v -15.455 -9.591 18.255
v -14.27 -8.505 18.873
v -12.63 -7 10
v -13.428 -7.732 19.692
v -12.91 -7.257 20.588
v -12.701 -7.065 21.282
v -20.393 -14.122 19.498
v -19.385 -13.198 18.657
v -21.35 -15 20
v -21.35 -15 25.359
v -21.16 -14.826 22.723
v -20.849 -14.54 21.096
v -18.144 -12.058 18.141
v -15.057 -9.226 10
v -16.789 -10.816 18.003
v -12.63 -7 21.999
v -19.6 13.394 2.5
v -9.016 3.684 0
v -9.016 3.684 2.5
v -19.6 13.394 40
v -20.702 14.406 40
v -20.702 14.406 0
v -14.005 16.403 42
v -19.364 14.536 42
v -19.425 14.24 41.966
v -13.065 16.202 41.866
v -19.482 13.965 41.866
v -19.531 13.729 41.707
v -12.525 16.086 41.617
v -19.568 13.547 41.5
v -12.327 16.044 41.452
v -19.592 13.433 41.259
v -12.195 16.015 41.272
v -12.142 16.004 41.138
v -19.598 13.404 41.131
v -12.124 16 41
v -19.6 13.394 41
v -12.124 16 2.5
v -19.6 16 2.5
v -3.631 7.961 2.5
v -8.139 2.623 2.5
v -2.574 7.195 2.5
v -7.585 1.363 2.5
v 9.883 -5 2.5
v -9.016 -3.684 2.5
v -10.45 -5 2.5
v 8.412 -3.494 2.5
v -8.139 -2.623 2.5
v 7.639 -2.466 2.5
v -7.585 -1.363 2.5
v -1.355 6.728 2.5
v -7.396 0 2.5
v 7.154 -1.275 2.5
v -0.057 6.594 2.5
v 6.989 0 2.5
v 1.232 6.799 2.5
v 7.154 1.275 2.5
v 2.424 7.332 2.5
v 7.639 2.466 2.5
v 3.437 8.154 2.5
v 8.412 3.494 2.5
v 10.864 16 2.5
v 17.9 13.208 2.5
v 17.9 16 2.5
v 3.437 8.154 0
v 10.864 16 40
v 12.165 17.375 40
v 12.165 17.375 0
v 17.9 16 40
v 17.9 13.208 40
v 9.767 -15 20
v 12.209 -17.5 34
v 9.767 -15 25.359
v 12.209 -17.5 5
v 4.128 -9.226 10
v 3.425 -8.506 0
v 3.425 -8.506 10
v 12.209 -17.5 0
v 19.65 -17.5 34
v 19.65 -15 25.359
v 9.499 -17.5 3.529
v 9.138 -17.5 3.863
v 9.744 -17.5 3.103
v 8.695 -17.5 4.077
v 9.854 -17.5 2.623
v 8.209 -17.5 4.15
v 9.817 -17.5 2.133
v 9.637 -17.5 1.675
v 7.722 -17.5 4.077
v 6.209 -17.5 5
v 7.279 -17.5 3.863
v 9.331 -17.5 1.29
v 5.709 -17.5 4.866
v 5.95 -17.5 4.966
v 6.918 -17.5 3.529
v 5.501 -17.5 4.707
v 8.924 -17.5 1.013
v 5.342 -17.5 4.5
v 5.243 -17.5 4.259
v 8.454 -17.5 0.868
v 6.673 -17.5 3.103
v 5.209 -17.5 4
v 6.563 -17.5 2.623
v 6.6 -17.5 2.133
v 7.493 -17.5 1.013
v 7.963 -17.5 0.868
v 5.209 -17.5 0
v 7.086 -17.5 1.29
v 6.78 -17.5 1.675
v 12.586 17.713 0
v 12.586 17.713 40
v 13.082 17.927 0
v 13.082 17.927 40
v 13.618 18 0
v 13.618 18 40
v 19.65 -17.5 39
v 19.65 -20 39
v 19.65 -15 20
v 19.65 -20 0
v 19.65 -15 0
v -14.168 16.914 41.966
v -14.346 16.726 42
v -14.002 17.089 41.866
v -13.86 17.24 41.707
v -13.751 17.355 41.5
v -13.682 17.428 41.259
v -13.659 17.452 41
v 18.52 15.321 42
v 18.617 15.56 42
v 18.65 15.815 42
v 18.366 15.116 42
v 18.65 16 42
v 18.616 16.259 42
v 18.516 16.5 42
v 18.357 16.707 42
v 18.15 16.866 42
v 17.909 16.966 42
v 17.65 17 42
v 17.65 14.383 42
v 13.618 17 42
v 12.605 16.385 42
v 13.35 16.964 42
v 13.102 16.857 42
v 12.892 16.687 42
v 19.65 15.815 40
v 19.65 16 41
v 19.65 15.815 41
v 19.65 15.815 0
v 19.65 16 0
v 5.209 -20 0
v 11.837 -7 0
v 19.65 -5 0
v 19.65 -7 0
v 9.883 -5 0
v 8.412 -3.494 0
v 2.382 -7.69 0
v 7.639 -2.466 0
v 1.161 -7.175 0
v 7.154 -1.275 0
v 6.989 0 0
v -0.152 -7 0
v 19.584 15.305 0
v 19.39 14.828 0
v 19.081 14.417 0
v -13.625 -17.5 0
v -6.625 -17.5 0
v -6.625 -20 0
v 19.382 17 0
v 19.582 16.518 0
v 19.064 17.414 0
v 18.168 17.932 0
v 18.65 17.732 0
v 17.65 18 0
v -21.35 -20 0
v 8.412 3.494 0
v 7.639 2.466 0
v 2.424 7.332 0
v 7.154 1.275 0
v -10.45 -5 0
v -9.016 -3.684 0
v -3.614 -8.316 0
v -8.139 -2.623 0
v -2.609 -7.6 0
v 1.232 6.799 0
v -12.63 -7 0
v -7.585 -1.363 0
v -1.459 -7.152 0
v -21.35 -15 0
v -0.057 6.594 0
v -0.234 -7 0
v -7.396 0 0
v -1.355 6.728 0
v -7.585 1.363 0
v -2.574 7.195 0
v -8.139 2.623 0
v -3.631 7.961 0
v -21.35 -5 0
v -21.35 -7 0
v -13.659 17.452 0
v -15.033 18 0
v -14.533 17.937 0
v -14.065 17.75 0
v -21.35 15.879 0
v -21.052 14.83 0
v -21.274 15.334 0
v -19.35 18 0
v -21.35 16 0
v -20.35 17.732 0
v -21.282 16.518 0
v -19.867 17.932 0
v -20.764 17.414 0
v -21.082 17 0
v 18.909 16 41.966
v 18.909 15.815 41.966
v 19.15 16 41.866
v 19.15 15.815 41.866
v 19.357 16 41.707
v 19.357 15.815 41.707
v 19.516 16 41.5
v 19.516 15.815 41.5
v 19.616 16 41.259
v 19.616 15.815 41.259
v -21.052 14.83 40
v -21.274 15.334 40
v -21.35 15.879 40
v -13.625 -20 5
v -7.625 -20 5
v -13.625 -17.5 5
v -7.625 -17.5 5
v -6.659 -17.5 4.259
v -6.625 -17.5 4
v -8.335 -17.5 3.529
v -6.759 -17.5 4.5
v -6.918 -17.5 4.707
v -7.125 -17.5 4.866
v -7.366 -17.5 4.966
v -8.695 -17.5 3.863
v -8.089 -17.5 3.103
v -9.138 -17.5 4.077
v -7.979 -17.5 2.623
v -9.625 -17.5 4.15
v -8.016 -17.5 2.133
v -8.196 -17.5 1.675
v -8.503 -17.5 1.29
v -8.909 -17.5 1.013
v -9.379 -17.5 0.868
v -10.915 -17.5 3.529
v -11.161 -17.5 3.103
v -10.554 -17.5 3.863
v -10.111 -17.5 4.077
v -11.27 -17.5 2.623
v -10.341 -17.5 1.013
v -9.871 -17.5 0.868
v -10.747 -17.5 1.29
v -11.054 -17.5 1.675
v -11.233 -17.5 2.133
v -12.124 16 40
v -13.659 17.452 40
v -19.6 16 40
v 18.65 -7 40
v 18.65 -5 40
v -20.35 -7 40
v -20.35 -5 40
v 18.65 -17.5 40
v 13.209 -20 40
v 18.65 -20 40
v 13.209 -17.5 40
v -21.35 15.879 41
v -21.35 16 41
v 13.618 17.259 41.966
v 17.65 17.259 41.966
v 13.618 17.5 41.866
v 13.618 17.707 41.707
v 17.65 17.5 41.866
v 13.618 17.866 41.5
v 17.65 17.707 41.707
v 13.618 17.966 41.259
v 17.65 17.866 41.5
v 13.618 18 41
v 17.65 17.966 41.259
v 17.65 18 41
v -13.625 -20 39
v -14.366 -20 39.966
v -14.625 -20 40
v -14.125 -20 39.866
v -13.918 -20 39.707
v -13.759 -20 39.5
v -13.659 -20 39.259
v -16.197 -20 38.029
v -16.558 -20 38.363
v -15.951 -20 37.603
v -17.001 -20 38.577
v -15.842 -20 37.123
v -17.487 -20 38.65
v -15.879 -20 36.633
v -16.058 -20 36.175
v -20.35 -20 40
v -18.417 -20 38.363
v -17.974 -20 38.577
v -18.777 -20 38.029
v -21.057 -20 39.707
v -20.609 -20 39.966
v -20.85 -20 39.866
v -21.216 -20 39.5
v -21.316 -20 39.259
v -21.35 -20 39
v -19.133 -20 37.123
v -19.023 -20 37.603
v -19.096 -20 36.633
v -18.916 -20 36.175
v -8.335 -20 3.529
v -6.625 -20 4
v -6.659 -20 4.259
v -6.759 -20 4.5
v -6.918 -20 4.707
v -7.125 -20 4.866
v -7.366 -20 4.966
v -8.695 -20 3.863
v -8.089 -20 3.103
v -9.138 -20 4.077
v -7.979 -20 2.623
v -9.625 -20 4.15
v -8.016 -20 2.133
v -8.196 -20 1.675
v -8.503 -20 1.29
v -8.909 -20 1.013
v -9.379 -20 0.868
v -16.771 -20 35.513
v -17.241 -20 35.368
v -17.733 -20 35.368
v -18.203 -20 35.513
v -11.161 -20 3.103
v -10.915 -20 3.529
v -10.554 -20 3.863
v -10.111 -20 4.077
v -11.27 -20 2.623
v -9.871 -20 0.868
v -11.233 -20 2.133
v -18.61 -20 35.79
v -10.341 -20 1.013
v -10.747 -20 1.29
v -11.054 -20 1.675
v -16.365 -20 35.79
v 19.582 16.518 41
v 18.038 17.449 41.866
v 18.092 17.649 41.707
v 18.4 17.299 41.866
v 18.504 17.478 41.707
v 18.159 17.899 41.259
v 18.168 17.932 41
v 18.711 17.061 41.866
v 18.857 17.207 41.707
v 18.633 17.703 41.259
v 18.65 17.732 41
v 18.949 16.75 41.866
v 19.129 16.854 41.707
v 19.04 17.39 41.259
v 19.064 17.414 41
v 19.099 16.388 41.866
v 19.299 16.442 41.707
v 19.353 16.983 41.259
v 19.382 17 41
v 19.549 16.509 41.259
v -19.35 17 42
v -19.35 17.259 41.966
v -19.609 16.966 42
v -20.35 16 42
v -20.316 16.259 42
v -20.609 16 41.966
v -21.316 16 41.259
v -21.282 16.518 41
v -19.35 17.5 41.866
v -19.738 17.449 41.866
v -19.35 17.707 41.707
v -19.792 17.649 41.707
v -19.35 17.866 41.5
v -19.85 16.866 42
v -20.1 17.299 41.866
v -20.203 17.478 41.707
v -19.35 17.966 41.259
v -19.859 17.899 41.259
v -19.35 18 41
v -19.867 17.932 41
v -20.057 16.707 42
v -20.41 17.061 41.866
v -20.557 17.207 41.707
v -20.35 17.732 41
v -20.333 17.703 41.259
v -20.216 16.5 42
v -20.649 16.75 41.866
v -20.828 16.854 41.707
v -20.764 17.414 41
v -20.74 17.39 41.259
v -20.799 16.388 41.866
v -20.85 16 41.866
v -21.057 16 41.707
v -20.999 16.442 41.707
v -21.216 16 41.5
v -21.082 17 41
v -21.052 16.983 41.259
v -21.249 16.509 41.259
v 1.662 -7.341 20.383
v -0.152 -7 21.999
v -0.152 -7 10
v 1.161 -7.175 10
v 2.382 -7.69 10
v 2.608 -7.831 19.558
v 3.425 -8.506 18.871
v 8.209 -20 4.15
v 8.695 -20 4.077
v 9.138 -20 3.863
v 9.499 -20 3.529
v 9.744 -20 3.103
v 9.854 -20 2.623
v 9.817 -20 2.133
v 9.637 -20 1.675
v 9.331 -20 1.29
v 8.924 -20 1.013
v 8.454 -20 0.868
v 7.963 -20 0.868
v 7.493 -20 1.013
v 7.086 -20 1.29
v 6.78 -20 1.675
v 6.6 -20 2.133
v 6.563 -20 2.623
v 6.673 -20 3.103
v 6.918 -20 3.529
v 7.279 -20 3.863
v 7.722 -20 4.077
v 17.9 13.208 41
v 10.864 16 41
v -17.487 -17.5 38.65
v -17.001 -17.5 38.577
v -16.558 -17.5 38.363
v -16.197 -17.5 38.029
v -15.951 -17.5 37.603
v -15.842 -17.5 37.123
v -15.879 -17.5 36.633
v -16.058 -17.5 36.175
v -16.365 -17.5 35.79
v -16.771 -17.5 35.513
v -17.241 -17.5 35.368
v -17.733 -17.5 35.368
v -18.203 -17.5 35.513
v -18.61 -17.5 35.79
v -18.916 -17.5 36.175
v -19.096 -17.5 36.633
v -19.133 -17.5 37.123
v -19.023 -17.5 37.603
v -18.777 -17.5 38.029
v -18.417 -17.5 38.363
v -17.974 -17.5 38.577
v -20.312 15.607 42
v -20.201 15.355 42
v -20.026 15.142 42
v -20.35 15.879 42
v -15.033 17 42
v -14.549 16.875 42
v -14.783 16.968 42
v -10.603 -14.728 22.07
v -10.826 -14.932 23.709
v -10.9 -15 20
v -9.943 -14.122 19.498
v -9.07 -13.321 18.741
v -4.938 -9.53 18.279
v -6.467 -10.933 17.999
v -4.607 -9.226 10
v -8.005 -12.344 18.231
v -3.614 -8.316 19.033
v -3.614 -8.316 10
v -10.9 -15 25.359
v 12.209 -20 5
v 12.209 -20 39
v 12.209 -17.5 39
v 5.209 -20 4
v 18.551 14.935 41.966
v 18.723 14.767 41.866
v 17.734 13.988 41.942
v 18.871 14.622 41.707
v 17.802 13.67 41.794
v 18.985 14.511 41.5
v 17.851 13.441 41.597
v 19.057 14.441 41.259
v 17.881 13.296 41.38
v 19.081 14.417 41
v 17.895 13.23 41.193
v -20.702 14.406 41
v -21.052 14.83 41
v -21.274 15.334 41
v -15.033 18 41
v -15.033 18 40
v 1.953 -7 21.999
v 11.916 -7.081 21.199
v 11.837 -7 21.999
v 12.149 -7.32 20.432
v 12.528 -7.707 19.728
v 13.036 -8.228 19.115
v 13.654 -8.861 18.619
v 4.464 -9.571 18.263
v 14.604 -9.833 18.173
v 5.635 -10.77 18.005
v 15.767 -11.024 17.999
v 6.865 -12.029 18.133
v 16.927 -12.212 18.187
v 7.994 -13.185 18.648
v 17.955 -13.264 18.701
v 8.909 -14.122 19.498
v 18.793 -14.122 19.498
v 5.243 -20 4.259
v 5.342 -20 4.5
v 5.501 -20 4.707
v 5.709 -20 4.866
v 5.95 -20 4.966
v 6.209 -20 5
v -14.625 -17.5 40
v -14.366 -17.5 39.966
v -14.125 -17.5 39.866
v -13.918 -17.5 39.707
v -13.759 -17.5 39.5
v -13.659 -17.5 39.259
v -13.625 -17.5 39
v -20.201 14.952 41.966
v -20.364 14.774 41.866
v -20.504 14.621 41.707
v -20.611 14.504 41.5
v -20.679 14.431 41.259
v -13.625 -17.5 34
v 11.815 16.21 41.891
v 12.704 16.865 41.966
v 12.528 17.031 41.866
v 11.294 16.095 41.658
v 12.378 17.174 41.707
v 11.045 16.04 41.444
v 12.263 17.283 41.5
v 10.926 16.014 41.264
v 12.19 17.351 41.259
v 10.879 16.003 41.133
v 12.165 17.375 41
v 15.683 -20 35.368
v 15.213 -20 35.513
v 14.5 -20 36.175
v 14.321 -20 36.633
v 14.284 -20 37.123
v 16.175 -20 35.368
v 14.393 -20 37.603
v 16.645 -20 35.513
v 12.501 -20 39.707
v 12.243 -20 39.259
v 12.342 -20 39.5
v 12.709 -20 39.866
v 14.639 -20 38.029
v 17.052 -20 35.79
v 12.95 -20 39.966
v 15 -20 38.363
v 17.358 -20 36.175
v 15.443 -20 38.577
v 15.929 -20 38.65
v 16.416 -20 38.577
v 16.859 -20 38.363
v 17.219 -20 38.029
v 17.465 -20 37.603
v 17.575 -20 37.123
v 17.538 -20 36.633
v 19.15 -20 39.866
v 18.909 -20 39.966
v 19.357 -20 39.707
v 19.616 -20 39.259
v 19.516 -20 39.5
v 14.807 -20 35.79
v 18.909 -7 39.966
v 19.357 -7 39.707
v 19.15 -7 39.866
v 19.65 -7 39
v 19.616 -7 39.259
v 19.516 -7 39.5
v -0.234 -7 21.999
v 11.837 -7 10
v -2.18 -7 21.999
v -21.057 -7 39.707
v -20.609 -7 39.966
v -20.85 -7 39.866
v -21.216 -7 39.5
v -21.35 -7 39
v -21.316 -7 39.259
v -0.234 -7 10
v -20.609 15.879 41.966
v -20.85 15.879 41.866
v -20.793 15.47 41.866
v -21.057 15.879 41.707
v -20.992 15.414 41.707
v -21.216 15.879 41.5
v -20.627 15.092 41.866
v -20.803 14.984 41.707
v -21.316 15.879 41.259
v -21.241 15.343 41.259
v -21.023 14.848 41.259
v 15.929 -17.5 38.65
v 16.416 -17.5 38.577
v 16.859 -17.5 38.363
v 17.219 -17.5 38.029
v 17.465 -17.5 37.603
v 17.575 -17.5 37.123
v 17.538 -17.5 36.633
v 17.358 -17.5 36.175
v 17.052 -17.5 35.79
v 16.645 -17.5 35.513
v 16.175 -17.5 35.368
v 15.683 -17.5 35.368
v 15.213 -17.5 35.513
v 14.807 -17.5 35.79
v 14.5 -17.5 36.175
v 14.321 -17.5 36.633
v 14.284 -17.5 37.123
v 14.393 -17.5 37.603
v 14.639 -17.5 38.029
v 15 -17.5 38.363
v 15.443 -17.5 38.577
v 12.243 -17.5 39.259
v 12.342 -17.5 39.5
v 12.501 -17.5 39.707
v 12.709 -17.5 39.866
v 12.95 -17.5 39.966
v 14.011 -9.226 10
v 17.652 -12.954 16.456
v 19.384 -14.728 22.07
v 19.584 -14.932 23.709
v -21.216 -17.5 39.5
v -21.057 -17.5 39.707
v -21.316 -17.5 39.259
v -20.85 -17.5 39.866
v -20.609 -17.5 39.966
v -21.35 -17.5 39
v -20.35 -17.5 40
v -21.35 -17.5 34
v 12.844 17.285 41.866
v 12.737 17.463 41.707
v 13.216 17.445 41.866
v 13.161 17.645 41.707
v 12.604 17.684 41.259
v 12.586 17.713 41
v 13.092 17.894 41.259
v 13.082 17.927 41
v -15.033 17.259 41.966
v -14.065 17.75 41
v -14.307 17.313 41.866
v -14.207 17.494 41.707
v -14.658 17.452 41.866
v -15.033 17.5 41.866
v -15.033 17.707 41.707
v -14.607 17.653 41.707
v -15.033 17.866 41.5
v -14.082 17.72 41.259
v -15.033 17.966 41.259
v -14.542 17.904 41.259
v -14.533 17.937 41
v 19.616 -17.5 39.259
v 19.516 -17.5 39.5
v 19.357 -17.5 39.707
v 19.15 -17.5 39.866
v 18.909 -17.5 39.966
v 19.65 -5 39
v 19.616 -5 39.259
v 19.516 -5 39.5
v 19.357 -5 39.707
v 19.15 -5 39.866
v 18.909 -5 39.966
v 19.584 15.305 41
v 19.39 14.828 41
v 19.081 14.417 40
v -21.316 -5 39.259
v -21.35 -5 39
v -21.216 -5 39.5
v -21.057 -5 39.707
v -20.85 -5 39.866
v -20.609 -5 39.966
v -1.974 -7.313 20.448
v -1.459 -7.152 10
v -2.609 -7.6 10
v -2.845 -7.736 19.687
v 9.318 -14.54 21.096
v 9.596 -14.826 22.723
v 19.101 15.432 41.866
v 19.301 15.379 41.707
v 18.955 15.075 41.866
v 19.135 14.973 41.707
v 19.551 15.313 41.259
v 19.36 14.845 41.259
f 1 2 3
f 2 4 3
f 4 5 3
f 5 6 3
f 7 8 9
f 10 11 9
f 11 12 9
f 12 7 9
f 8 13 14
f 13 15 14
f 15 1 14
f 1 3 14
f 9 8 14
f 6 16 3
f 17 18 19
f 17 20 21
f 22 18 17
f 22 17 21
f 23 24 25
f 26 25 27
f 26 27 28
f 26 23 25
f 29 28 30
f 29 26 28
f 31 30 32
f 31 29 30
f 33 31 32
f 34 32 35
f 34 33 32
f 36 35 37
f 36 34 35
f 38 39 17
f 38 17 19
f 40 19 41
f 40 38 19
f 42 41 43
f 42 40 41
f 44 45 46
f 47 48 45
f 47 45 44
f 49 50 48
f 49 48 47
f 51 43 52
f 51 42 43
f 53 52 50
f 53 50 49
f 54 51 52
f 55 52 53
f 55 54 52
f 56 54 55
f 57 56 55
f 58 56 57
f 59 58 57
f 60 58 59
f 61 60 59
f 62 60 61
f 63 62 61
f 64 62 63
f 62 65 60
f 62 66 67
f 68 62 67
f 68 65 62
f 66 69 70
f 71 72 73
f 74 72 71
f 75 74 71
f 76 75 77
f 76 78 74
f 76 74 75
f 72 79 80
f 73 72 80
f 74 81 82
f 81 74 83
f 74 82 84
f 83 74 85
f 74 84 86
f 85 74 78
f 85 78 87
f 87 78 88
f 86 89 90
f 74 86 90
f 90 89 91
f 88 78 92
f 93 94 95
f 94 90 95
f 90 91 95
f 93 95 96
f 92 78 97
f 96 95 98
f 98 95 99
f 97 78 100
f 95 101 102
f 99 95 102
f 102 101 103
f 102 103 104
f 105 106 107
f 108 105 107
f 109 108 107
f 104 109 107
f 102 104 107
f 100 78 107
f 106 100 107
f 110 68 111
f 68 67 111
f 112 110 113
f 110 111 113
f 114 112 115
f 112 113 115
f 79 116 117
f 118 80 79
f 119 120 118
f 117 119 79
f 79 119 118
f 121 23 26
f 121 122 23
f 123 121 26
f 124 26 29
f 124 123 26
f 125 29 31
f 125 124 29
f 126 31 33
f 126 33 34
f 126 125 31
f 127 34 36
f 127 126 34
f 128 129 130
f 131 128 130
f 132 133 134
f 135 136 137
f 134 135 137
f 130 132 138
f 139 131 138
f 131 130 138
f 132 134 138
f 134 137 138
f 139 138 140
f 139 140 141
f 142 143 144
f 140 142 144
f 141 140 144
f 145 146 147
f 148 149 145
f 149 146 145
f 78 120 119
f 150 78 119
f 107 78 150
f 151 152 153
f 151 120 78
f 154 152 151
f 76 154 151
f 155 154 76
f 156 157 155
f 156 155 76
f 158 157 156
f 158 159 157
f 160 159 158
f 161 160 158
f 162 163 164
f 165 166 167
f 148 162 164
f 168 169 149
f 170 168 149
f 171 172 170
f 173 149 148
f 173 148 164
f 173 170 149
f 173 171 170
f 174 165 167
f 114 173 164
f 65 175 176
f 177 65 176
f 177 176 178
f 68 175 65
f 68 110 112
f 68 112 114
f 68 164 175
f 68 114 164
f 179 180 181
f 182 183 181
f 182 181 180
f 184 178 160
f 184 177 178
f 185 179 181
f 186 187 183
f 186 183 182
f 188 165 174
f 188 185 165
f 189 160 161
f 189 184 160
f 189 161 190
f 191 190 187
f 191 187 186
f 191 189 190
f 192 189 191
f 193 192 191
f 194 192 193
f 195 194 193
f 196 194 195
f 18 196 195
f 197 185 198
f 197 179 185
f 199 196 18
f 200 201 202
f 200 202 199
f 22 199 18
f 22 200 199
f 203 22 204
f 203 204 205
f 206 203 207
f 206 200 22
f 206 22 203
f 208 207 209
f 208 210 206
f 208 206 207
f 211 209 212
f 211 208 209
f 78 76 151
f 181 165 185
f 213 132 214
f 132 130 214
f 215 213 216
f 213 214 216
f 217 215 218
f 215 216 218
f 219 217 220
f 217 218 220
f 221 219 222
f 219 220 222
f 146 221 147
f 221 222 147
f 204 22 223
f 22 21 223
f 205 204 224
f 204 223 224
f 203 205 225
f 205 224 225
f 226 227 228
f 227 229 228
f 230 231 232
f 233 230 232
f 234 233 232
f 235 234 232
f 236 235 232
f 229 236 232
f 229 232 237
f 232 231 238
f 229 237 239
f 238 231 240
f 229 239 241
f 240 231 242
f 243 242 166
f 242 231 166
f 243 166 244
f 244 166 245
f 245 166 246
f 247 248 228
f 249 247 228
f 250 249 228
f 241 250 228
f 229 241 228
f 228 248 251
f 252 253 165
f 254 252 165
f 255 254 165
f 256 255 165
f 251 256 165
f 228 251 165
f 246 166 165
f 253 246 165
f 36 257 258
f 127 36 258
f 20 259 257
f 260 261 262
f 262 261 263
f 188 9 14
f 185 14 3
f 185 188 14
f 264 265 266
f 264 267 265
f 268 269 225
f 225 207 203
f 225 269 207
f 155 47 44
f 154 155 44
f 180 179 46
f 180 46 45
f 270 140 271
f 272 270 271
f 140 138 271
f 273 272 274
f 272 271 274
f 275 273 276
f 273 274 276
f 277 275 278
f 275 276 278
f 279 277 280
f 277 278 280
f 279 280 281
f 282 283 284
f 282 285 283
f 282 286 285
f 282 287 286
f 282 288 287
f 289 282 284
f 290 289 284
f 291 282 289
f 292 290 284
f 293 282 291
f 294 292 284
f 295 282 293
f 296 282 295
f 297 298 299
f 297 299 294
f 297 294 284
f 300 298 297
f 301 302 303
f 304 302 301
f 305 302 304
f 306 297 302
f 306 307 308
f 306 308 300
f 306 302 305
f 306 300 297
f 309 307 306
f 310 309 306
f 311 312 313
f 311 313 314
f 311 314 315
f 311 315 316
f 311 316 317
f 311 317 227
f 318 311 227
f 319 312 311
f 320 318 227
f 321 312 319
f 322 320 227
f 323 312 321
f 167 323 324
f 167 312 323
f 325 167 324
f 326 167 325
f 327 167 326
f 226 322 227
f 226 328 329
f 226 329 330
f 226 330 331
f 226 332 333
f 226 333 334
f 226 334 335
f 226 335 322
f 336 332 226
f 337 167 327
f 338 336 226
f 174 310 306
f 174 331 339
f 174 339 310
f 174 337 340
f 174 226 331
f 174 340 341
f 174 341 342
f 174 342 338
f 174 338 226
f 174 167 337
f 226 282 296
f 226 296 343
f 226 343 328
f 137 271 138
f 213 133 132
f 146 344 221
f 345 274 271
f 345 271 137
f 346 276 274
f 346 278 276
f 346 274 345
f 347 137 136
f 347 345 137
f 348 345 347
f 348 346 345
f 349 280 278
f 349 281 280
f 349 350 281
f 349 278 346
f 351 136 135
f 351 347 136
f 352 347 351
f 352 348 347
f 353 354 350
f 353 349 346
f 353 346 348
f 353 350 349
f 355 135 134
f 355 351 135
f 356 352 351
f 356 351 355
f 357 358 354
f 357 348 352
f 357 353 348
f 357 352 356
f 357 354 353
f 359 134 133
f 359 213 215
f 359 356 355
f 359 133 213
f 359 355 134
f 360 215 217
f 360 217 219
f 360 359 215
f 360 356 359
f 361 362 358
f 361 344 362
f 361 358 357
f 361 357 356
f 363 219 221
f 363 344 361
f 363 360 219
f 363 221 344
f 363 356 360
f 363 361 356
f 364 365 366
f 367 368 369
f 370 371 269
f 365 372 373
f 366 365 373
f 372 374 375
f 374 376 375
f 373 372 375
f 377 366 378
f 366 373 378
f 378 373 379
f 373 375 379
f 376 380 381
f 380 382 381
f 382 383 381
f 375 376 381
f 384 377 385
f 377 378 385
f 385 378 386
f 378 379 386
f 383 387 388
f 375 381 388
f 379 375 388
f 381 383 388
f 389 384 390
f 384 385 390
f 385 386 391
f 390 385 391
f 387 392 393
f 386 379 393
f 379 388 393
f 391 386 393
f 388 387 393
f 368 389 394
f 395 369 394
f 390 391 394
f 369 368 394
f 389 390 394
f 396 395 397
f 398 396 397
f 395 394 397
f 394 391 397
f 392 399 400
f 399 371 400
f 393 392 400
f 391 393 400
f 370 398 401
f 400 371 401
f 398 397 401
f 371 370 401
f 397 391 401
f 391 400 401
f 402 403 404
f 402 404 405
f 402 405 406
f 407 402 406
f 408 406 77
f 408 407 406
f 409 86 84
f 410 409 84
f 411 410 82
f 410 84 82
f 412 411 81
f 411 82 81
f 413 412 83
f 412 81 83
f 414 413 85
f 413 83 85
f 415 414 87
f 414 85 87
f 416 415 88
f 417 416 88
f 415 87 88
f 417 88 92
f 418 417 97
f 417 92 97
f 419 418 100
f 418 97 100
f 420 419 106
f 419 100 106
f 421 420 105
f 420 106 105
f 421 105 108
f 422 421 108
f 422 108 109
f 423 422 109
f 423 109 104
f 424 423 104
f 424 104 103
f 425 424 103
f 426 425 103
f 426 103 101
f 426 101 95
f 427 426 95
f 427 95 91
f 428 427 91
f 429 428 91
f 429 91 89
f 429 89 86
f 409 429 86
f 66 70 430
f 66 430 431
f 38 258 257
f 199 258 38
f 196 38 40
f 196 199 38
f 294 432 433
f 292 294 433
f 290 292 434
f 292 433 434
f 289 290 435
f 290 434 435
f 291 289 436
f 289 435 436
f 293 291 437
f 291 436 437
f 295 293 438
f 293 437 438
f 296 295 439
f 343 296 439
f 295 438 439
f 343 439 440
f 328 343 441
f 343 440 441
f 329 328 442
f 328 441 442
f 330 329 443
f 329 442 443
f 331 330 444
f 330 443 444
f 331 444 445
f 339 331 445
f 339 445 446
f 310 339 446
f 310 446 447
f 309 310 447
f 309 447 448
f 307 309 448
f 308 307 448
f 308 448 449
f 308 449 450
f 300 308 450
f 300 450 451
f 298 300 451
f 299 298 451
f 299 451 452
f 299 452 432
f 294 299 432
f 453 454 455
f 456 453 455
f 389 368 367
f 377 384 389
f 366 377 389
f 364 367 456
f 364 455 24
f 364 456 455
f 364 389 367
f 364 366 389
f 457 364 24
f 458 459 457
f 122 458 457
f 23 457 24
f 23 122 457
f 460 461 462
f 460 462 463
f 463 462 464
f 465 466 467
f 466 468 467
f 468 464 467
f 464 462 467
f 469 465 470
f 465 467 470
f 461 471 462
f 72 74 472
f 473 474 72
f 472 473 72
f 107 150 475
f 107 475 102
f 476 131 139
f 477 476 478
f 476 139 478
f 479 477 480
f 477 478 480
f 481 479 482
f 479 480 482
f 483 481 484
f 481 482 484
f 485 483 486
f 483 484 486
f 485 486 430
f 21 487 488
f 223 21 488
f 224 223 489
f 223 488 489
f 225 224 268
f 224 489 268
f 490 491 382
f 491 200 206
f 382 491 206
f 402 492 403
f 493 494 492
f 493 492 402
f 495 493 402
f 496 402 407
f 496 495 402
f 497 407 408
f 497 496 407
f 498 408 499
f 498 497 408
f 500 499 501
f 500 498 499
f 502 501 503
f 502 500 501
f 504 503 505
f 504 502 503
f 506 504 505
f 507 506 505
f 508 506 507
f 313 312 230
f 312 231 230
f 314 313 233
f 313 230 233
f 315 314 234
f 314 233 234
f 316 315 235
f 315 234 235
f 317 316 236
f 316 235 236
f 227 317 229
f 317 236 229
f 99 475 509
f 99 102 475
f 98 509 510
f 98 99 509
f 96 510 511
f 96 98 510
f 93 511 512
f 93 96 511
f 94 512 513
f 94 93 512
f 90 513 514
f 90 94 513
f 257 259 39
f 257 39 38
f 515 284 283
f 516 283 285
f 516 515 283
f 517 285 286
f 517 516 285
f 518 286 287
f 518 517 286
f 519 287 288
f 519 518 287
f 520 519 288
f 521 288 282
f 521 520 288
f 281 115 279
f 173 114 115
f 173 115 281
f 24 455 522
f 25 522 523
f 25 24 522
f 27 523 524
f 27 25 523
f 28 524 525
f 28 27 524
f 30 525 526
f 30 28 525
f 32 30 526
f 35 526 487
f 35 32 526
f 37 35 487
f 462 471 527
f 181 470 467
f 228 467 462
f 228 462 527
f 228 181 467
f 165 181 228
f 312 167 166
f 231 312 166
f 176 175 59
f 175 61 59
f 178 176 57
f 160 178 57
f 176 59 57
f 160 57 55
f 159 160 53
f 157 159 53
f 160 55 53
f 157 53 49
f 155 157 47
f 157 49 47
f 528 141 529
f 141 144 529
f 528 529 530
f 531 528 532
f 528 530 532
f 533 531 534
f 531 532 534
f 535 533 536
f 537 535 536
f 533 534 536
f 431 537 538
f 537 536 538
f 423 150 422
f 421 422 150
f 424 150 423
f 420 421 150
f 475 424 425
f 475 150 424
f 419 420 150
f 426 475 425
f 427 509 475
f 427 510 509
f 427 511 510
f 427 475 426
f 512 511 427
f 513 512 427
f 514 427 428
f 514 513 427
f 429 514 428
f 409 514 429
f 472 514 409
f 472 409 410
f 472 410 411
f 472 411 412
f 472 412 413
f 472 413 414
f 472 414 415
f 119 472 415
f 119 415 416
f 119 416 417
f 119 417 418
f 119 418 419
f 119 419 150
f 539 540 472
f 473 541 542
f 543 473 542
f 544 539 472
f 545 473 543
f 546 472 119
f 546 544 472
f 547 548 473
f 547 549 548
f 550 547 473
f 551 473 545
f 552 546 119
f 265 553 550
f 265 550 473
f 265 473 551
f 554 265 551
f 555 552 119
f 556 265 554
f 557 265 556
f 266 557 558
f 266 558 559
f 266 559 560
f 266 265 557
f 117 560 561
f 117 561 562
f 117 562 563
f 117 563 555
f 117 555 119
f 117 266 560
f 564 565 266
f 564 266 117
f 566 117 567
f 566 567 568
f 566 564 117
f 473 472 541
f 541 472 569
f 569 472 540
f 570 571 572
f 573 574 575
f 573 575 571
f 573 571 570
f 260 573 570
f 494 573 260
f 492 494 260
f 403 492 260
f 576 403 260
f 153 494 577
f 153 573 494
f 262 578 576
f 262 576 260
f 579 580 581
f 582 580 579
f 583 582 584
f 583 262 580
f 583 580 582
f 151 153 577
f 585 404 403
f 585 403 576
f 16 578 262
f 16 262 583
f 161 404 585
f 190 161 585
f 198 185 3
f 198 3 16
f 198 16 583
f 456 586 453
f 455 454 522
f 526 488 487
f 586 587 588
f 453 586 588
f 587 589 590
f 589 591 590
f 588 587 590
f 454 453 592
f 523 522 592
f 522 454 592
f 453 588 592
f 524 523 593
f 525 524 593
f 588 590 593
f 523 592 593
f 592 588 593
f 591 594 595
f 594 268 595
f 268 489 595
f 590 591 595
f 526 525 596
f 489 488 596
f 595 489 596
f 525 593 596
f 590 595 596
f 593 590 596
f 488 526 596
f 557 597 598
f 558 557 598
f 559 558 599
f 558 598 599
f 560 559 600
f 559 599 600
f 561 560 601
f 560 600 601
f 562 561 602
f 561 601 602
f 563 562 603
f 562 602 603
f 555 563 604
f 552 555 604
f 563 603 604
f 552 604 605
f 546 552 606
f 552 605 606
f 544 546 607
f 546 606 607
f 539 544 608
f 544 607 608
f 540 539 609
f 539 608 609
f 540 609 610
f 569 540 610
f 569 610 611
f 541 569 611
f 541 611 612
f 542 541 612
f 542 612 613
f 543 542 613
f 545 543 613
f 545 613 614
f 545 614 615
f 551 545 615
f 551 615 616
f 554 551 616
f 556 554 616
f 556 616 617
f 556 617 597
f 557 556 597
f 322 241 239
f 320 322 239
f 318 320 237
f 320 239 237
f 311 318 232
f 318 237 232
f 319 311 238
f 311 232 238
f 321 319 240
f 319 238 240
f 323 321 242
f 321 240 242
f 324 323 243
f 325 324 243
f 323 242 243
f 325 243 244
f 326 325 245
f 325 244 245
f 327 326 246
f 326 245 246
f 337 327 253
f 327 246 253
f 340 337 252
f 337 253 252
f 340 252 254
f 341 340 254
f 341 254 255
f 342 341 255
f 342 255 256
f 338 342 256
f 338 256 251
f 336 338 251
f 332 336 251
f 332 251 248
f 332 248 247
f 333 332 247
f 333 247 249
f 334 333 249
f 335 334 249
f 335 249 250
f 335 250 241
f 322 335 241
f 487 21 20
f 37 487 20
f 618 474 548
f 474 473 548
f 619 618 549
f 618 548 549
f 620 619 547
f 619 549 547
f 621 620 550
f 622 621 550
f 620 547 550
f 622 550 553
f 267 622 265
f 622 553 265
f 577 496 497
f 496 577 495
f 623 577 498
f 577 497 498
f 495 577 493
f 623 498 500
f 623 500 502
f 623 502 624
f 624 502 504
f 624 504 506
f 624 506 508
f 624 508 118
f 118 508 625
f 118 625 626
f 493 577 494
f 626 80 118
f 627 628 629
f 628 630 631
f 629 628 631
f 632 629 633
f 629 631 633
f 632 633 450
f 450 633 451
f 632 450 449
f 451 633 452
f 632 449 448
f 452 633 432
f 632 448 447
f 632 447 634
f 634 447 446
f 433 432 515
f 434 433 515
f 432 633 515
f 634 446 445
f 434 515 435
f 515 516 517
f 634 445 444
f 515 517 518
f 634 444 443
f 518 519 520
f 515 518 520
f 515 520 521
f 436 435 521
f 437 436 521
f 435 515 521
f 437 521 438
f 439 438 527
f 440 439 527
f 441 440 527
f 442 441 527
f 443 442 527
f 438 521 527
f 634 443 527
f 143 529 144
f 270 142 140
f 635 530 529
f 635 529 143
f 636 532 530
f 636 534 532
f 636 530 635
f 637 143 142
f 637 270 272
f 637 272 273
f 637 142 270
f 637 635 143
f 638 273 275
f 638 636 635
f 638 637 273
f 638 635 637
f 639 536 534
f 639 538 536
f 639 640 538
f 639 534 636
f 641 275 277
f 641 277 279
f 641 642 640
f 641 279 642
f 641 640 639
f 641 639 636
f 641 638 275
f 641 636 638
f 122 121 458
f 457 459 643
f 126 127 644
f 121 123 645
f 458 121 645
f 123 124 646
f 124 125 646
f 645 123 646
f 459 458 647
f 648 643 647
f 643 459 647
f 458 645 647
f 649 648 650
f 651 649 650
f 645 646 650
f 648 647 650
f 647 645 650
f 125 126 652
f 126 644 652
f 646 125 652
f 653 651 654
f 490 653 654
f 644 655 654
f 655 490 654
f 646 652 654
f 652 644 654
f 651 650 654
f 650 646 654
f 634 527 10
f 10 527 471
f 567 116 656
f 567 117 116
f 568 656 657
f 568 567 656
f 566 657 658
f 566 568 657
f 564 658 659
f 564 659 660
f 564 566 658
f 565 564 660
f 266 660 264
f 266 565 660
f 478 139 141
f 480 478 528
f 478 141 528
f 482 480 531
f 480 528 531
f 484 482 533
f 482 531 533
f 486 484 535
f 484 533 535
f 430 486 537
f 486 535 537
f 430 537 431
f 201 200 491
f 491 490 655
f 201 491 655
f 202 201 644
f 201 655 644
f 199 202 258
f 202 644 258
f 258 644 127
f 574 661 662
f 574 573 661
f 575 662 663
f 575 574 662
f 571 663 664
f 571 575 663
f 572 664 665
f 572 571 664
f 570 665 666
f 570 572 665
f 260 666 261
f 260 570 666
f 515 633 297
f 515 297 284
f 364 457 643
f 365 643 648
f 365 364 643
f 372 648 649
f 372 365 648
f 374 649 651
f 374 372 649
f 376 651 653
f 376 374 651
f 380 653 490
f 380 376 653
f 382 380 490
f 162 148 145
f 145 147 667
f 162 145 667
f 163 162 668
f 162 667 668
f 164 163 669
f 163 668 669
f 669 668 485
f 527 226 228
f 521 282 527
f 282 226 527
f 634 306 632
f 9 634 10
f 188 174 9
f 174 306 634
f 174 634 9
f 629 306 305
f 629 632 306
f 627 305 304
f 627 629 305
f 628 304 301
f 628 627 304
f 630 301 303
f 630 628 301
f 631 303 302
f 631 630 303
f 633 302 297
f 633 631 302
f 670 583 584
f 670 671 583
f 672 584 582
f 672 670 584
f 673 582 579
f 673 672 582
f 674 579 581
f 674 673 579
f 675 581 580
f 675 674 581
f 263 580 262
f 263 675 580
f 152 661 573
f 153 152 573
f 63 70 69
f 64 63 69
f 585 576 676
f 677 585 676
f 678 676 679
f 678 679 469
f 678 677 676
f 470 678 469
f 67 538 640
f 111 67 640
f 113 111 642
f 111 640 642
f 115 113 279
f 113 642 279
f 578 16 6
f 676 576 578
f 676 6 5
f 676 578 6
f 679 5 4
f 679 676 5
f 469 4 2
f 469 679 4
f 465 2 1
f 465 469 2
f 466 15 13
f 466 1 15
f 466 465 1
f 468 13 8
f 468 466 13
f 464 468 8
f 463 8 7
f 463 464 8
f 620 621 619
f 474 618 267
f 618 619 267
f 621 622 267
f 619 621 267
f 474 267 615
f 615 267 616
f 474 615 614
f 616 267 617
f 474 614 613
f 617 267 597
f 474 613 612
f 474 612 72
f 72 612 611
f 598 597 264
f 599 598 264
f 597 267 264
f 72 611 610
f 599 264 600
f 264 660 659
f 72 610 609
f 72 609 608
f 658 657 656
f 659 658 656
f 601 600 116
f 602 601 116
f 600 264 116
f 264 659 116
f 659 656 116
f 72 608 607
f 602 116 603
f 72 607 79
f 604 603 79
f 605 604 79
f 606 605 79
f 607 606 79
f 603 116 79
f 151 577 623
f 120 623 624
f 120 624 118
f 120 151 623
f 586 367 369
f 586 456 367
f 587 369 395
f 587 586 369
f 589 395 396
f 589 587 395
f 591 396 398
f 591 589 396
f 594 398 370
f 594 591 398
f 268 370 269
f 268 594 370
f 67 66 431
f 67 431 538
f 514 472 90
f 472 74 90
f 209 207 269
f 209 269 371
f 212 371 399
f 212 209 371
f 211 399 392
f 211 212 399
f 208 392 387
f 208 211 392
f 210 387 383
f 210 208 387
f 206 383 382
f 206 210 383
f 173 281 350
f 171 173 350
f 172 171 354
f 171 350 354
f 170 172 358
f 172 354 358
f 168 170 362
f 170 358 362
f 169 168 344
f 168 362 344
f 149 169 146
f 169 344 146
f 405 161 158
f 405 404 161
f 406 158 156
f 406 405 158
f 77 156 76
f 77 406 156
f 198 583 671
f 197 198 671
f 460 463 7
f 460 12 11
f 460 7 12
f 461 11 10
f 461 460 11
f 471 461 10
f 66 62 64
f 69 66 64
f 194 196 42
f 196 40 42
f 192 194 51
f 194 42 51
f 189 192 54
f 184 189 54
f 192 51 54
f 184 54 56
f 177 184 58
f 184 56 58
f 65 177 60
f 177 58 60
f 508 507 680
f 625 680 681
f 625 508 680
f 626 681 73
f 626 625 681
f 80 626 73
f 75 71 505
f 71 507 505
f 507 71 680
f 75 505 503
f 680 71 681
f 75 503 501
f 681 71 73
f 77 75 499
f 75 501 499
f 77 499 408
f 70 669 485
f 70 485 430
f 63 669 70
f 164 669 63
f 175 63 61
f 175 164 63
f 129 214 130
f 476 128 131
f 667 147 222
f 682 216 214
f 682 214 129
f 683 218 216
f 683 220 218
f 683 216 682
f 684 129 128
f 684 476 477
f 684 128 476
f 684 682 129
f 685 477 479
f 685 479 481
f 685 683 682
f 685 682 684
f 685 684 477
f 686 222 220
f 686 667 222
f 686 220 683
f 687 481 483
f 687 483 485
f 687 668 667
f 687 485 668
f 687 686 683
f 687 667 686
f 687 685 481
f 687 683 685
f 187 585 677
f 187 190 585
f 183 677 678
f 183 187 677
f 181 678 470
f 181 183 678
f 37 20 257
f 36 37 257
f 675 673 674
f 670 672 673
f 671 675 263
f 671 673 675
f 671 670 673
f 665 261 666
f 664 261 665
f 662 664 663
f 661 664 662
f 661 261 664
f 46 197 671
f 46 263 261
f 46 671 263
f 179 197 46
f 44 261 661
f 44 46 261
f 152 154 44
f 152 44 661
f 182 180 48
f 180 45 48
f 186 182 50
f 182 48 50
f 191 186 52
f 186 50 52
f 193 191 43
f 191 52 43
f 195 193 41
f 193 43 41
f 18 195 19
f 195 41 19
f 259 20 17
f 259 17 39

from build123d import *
from OCP.BRepFilletAPI import BRepFilletAPI_MakeChamfer

# Parameters (mm, degrees)
BOSS_EXTRUDE1_DEPTH = 40
SKETCH3_W           = 37.5
SKETCH3_H           = 21
SKETCH3_W_2         = 41
SKETCH3_H_2         = 2
CUT_EXTRUDE1_DEPTH  = 37.5
SKETCH4_W           = 50.283363854
SKETCH4_H           = 54.333359839
CUT_EXTRUDE2_DEPTH  = 37.5
BOSS_EXTRUDE2_DEPTH = 2
SKETCH6_W           = 30
SKETCH6_H           = 8
CUT_EXTRUDE3_DEPTH  = 100
CHAMFER1_SIZE       = 10
CHAMFER1_SIZE2      = 5.773502692
FILLET2_R           = 20
FILLET3_R           = 4
FILLET4_R           = 5
CUT_EXTRUDE4_DEPTH  = 100
BOSS_EXTRUDE3_REACH = 51.556
SKETCH9_R           = 1.65
CUT_EXTRUDE5_DEPTH  = 100
SKETCH10_W          = 7
SKETCH10_H          = 2.5
BOSS_EXTRUDE4_DEPTH = 5
SKETCH11_R          = 1.65
CUT_EXTRUDE6_DEPTH  = 5
FILLET5_R           = 1
FILLET6_R           = 1
FILLET7_R           = 2
FILLET8_R           = 1
FILLET9_R           = 1


with BuildPart() as part:
    # Sketch2 → Boss-Extrude1 (new body)
    with BuildSketch(Plane.XY):
        Polygon((-2.179971033, -7), (-16.349782749, -20), (-21.349782749, -20), (-21.349782749, -15), (-12.629898616, -7), (-21.349782749, -7), (-21.349782749, -5), (-10.449927583, -5), (-5, 0), (-21.349782749, 15), (-21.349782749, 20), (-16.349782749, 20), (0, 4.52331207), (14.650217251, 20), (19.650217251, 20), (19.650217251, 15), (5, 0), (9.88340575, -5), (19.650217251, -5), (19.650217251, -7), (11.83676805, -7), (19.650217251, -15), (19.650217251, -20), (14.650217251, -20), (1.9533623, -7), align=None)
    extrude(amount=BOSS_EXTRUDE1_DEPTH)

    # Sketch3 → Cut-Extrude1 (cut)
    with BuildSketch(Plane.XY.offset(40)):
        with Locations((-0.849782749, 5.5)):
            Rectangle(SKETCH3_W, SKETCH3_H)
        with Locations((-0.849782749, 19)):
            Rectangle(SKETCH3_W_2, SKETCH3_H_2)
    extrude(amount=-CUT_EXTRUDE1_DEPTH, mode=Mode.SUBTRACT)

    # Sketch4 → Cut-Extrude2 (cut)
    with BuildSketch(Plane(origin=(0, 18, 0), x_dir=(1, 0, 0), z_dir=(0, 1, 0))):
        with Locations((3.791899178, 24.66667992)):
            Rectangle(SKETCH4_W, SKETCH4_H)
    extrude(amount=CUT_EXTRUDE2_DEPTH, mode=Mode.SUBTRACT)

    # Sketch5 → Boss-Extrude2 (add)
    with BuildSketch(Plane.XY.offset(40)):
        Polygon((-21.349782749, 15), (-19.599782749, 13.394474079), (-12.124128572, 16), (-14.236955661, 18), (-21.349782749, 18), align=None)
        Polygon((10.863821268, 16), (12.75701926, 18), (19.650217251, 18), (19.650217251, 15), (17.900217251, 13.208217697), align=None)
    extrude(amount=BOSS_EXTRUDE2_DEPTH)

    # Sketch6 → Cut-Extrude3 (cut)
    with BuildSketch(Plane(origin=(19.650217251, 0, 0), x_dir=(0, 0, -1), z_dir=(1, 0, 0))):
        with Locations((-25, -11)):
            Rectangle(SKETCH6_W, SKETCH6_H)
    extrude(amount=-CUT_EXTRUDE3_DEPTH, mode=Mode.SUBTRACT)

    # Chamfer1: one chamfer whose edges measure the first distance from different faces: ONE call of the kernel's chamfer builder (chamfer() names one face for all edges)
    chamfer1_edges_1 = [part.edges().sort_by_distance(p)[0] for p in [
        (-16.124818958, -15, 10),
    ]]
    chamfer1_side_1 = [part.faces().sort_by_distance(p)[0] for p in [
        (-16.124818958, -15, 25),
    ]]
    chamfer1_edges_2 = [part.edges().sort_by_distance(p)[0] for p in [
        (14.708514376, -15, 10),
    ]]
    chamfer1_side_2 = [part.faces().sort_by_distance(p)[0] for p in [
        (14.708514376, -15, 25),
    ]]
    chamfer1 = BRepFilletAPI_MakeChamfer(part.part.solid().wrapped)
    for e in chamfer1_edges_1:
        chamfer1.Add(CHAMFER1_SIZE, CHAMFER1_SIZE2, e.wrapped, chamfer1_side_1[0].wrapped)  # the first distance lies on this face
    for e in chamfer1_edges_2:
        chamfer1.Add(CHAMFER1_SIZE, CHAMFER1_SIZE2, e.wrapped, chamfer1_side_2[0].wrapped)  # the first distance lies on this face
    add(Compound.cast(chamfer1.Shape()), mode=Mode.REPLACE)

    # Fillet2
    # the kernel refuses this fillet: 20 mm, written as the material it adds along each edge
    with BuildSketch(Plane(origin=(14.02999004, -9.226497308, 10), x_dir=(0, 1, 0), z_dir=(-1, 0, 0))) as fillet2_piece_1_section:
        with BuildLine():
            CenterArc((13.593145897, -16.455980671), FILLET2_R, 124.634022664, 25.365977336)
            Line((-3.727362178, -6.455980671), (0, 0))
            Line((0, 0), (2.226497308, 0))
        make_face()
    fillet2_piece_1 = extrude(amount=47.723549367, mode=Mode.PRIVATE)
    fillet2_piece_1 = split(fillet2_piece_1, bisect_by=Plane(origin=(14.020448108, -9.235816733, 10), z_dir=(-0.7153987205247665, -0.6987164451131282, 0)), keep=Keep.TOP, mode=Mode.PRIVATE)
    fillet2_piece_1 = split(fillet2_piece_1, bisect_by=Plane(origin=(8.962167208, -14.17614434, 10), z_dir=(0.7153987205247687, 0.6987164451131259, 0)), keep=Keep.TOP, mode=Mode.PRIVATE)
    add(fillet2_piece_1)
    with BuildSketch(Plane(origin=(14.02999004, -9.226497308, 10), x_dir=(0, 1, 0), z_dir=(-1, 0, 0))) as fillet2_piece_2_section:
        with BuildLine():
            CenterArc((13.593145897, -16.455980671), FILLET2_R, 124.634022664, 25.365977336)
            Line((-3.727362178, -6.455980671), (0, 0))
            Line((0, 0), (2.226497308, 0))
        make_face()
    fillet2_piece_2 = extrude(amount=47.723549367, mode=Mode.PRIVATE)
    fillet2_piece_2 = split(fillet2_piece_2, bisect_by=Plane(origin=(5.512518344, 0.057423479, 10), z_dir=(-0.6760355748646789, 0.7368689853137959, 0)), keep=Keep.TOP, mode=Mode.PRIVATE)
    fillet2_piece_2 = split(fillet2_piece_2, bisect_by=Plane(origin=(0.736649611, 5.263051227, 10), z_dir=(0.6760355748646789, -0.7368689853137959, 0)), keep=Keep.TOP, mode=Mode.PRIVATE)
    add(fillet2_piece_2)
    with BuildSketch(Plane(origin=(2.497604455, -15, 20), x_dir=(0, 0.5000000000000009, -0.866025403784438), z_dir=(-1, 0, 0))) as fillet2_piece_3_section:
        with BuildLine():
            CenterArc((FILLET2_R * 0.267949192431, -FILLET2_R), FILLET2_R, 90, 30)
            Line((-FILLET2_R * 0.232050807569, -FILLET2_R * 0.133974596216), (0, 0))
            Line((0, 0), (FILLET2_R * 0.267949192431, 0))
        make_face()
    fillet2_piece_3 = extrude(amount=37.244846826, mode=Mode.PRIVATE)
    fillet2_piece_3 = split(fillet2_piece_3, bisect_by=Plane(origin=(-3.62535745, -8.326060204, 20), z_dir=(-0.6760355748646789, 0.7368689853137959, 0)), keep=Keep.TOP, mode=Mode.PRIVATE)
    fillet2_piece_3 = split(fillet2_piece_3, bisect_by=Plane(origin=(-8.401226183, -3.120432456, 20), z_dir=(0.6760355748646789, -0.7368689853137959, 0)), keep=Keep.TOP, mode=Mode.PRIVATE)
    add(fillet2_piece_3)
    with BuildSketch(Plane(origin=(32.648156894, -9.226497308, 10), x_dir=(0, -0.5000000000000011, 0.8660254037844379), z_dir=(-1, 0, 0))) as fillet2_piece_4_section:
        with BuildLine():
            CenterArc((7.454724357, 20), FILLET2_R, 244.634022664, 25.365977336)
            Line((-1.113248654, 1.92820323), (0, 0))
            Line((0, 0), (7.454724357, 0))
        make_face()
    fillet2_piece_4 = extrude(amount=47.157027534, mode=Mode.PRIVATE)
    fillet2_piece_4 = split(fillet2_piece_4, bisect_by=Plane(origin=(23.109924126, -18.542309458, 10), z_dir=(-0.7153987205247665, -0.6987164451131282, 0)), keep=Keep.TOP, mode=Mode.PRIVATE)
    fillet2_piece_4 = split(fillet2_piece_4, bisect_by=Plane(origin=(18.051643225, -23.482637065, 10), z_dir=(0.7153987205247687, 0.6987164451131259, 0)), keep=Keep.TOP, mode=Mode.PRIVATE)
    add(fillet2_piece_4)
    with BuildSketch(Plane(origin=(32.648156894, -9.226497308, 10), x_dir=(0, -0.5000000000000011, 0.8660254037844379), z_dir=(-1, 0, 0))) as fillet2_piece_5_section:
        with BuildLine():
            CenterArc((7.454724357, 20), FILLET2_R, 244.634022664, 25.365977336)
            Line((-1.113248654, 1.92820323), (0, 0))
            Line((0, 0), (7.454724357, 0))
        make_face()
    fillet2_piece_5 = extrude(amount=47.157027534, mode=Mode.PRIVATE)
    fillet2_piece_5 = split(fillet2_piece_5, bisect_by=Plane(origin=(15.621734276, 9.332056745, 10), z_dir=(-0.6760355748646789, 0.7368689853137959, 0)), keep=Keep.TOP, mode=Mode.PRIVATE)
    fillet2_piece_5 = split(fillet2_piece_5, bisect_by=Plane(origin=(10.845865543, 14.537684493, 10), z_dir=(0.6760355748646789, -0.7368689853137959, 0)), keep=Keep.TOP, mode=Mode.PRIVATE)
    add(fillet2_piece_5)
    with BuildSketch(Plane(origin=(33.047676872, -15, 20), x_dir=(0, 0.5000000000000009, -0.866025403784438), z_dir=(-1, 0, 0))) as fillet2_piece_6_section:
        with BuildLine():
            CenterArc((FILLET2_R * 0.267949192431, -FILLET2_R), FILLET2_R, 90, 30)
            Line((-FILLET2_R * 0.232050807569, -FILLET2_R * 0.133974596216), (0, 0))
            Line((0, 0), (FILLET2_R * 0.267949192431, 0))
        make_face()
    fillet2_piece_6 = extrude(amount=36.678324993, mode=Mode.PRIVATE)
    fillet2_piece_6 = split(fillet2_piece_6, bisect_by=Plane(origin=(26.190919613, -21.696865566, 20), z_dir=(-0.7153987205247665, -0.6987164451131282, 0)), keep=Keep.TOP, mode=Mode.PRIVATE)
    fillet2_piece_6 = split(fillet2_piece_6, bisect_by=Plane(origin=(21.132638712, -26.637193173, 20), z_dir=(0.7153987205247687, 0.6987164451131259, 0)), keep=Keep.TOP, mode=Mode.PRIVATE)
    add(fillet2_piece_6)

    # Fillet3
    # the kernel refuses this fillet: 4 mm, written as the material it adds along each edge
    with BuildSketch(Plane(origin=(45.374542852, -7, 10), x_dir=(0, -0.5845395374156303, 0.8113652255291207), z_dir=(-1, 0, 0))) as fillet3_piece_1_section:
        with BuildLine():
            CenterArc((12.073598928, 3.768334945), FILLET3_R, 125.7704671, 163.825043137)
            Line((9.735440779, 7.013795847), (0, 0))
            ThreePointArc((0, 0), (6.70755496, -1.158325275), (13.41510992, 0))
        make_face()
    fillet3_piece_1 = extrude(amount=76.958955353, mode=Mode.PRIVATE)
    fillet3_piece_1 = split(fillet3_piece_1, bisect_by=Plane(origin=(23.151785451, -28.704548255, 10), z_dir=(0.7153987205249446, 0.6987164451129458, 0)), keep=Keep.TOP, mode=Mode.PRIVATE)
    fillet3_piece_1 = split(fillet3_piece_1, bisect_by=Plane(origin=(28.210066352, -23.764220648, 10), z_dir=(-0.7153987205249446, -0.6987164451129458, 0)), keep=Keep.TOP, mode=Mode.PRIVATE)
    add(fillet3_piece_1)
    with BuildSketch(Plane(origin=(45.374542852, -7, 10), x_dir=(0, -0.5845395374156303, 0.8113652255291207), z_dir=(-1, 0, 0))) as fillet3_piece_2_section:
        with BuildLine():
            CenterArc((12.073598928, 3.768334945), FILLET3_R, 125.7704671, 163.825043137)
            Line((9.735440779, 7.013795847), (0, 0))
            ThreePointArc((0, 0), (6.70755496, -1.158325275), (13.41510992, 0))
        make_face()
    fillet3_piece_2 = extrude(amount=76.958955353, mode=Mode.PRIVATE)
    fillet3_piece_2 = split(fillet3_piece_2, bisect_by=Plane(origin=(23.640984015, 16.689264357, 10), z_dir=(-0.6760355748647515, 0.7368689853137292, 0)), keep=Keep.TOP, mode=Mode.PRIVATE)
    fillet3_piece_2 = split(fillet3_piece_2, bisect_by=Plane(origin=(18.865115282, 21.894892105, 10), z_dir=(0.6760355748647515, -0.7368689853137292, 0)), keep=Keep.TOP, mode=Mode.PRIVATE)
    add(fillet3_piece_2)
    with BuildSketch(Plane(origin=(31.357803768, -7, 10), x_dir=(0, 0, 1), z_dir=(-1, 0, 0))) as fillet3_piece_3_section:
        with BuildLine():
            CenterArc((11.998839083, -4), FILLET3_R, 90, 163.825043137)
            ThreePointArc((10.884553686, -7.841662147), (4.765189923, -4.860655921), (0, 0))
            Line((0, 0), (11.998839083, 0))
        make_face()
    fillet3_piece_3 = extrude(amount=77.525477185, mode=Mode.PRIVATE)
    fillet3_piece_3 = split(fillet3_piece_3, bisect_by=Plane(origin=(16.308747963, -21.698129131, 10), z_dir=(0.7153987205249446, 0.6987164451129458, 0)), keep=Keep.TOP, mode=Mode.PRIVATE)
    fillet3_piece_3 = split(fillet3_piece_3, bisect_by=Plane(origin=(21.367028864, -16.757801523, 10), z_dir=(-0.7153987205249446, -0.6987164451129458, 0)), keep=Keep.TOP, mode=Mode.PRIVATE)
    add(fillet3_piece_3)
    with BuildSketch(Plane(origin=(31.357803768, -7, 10), x_dir=(0, 0, 1), z_dir=(-1, 0, 0))) as fillet3_piece_4_section:
        with BuildLine():
            CenterArc((11.998839083, -4), FILLET3_R, 90, 163.825043137)
            ThreePointArc((10.884553686, -7.841662147), (4.765189923, -4.860655921), (0, 0))
            Line((0, 0), (11.998839083, 0))
        make_face()
    fillet3_piece_4 = extrude(amount=77.525477185, mode=Mode.PRIVATE)
    fillet3_piece_4 = split(fillet3_piece_4, bisect_by=Plane(origin=(11.254363742, 14.912458463, 10), z_dir=(0.6760355748647515, -0.7368689853137292, 0)), keep=Keep.TOP, mode=Mode.PRIVATE)
    fillet3_piece_4 = split(fillet3_piece_4, bisect_by=Plane(origin=(16.030232474, 9.706830715, 10), z_dir=(-0.6760355748647515, 0.7368689853137292, 0)), keep=Keep.TOP, mode=Mode.PRIVATE)
    add(fillet3_piece_4)

    # Fillet4
    fillet4_edges = [part.edges().sort_by_distance(p)[0] for p in [
        (1.9533623, -7, 10.999419542),
        (-2.179971033, -7, 10.999419542),
        (0, 4.52331207, 1.25),
        (-5, 0, 1.25),
        (5, 0, 1.25),
    ]]
    fillet(fillet4_edges, radius=FILLET4_R)

    # Sketch7 → Cut-Extrude4 (cut)
    with BuildSketch(Plane(origin=(19.650217251, 0, 0), x_dir=(0, 0, -1), z_dir=(1, 0, 0))):
        Polygon((-40, -17.5), (-34, -17.5), (-25.358983849, -15), (-40, -15), align=None)
    extrude(amount=-CUT_EXTRUDE4_DEPTH, mode=Mode.SUBTRACT)

    # Boss-Extrude3: up to this face of the body (flat: up to its plane)
    boss_extrude3_end = Plane(part.part.faces().sort_by_distance((-0.697208097, -1.016556484, 0))[0])
    # Sketch8 → Boss-Extrude3 (add, up to the picked face)
    with BuildSketch(Plane.XY.offset(40), mode=Mode.PRIVATE) as boss_extrude3_sk1:
        Polygon((-13.624818958, -17.5), (-16.349782749, -20), (-13.624818958, -20), align=None)
    boss_extrude3_tool1 = split(extrude(boss_extrude3_sk1.sketch, amount=-BOSS_EXTRUDE3_REACH, mode=Mode.PRIVATE), bisect_by=boss_extrude3_end, keep=Keep.BOTH, mode=Mode.PRIVATE)
    # Sketch8 → Boss-Extrude3 (add, up to the picked face)
    with BuildSketch(Plane.XY.offset(40), mode=Mode.PRIVATE) as boss_extrude3_sk2:
        Polygon((14.650217251, -20), (12.208514376, -17.5), (12.208514376, -20), align=None)
    boss_extrude3_tool2 = split(extrude(boss_extrude3_sk2.sketch, amount=-BOSS_EXTRUDE3_REACH, mode=Mode.PRIVATE), bisect_by=boss_extrude3_end, keep=Keep.BOTH, mode=Mode.PRIVATE)
    add(boss_extrude3_tool1.solids().sort_by(Axis((-14.53314, -19.166667, 40), (0, 0, -1)))[0])
    add(boss_extrude3_tool2.solids().sort_by(Axis((13.022415, -19.166667, 40), (0, 0, -1)))[0])

    # Sketch9 → Cut-Extrude5 (cut)
    with BuildSketch(Plane(origin=(0, -17.5, 0), x_dir=(1, 0, 0), z_dir=(0, 1, 0))):
        with Locations(Location((-17.487300853, -37, 0), (0, 0, 270))):
            Circle(SKETCH9_R)
        with Locations(Location((15.929365813, -37, 0), (0, 0, 270))):
            Circle(SKETCH9_R)
    extrude(amount=-CUT_EXTRUDE5_DEPTH, mode=Mode.SUBTRACT)

    # Sketch10 → Boss-Extrude4 (add)
    with BuildSketch(Plane(origin=(0, 0, 0), x_dir=(-1, 0, 0), z_dir=(0, 0, -1))):
        with Locations((10.124818958, -18.75)):
            Rectangle(SKETCH10_W, SKETCH10_H)
        with Locations((-8.708514376, -18.75)):
            Rectangle(SKETCH10_W, SKETCH10_H)
    extrude(amount=-BOSS_EXTRUDE4_DEPTH)

    # Sketch11 → Cut-Extrude6 (cut)
    with BuildSketch(Plane(origin=(0, -17.5, 0), x_dir=(1, 0, 0), z_dir=(0, 1, 0))):
        with Locations(Location((8.208514376, -2.5, 0), (0, 0, 270))):
            Circle(SKETCH11_R)
        with Locations(Location((-9.624818958, -2.5, 0), (0, 0, 270))):
            Circle(SKETCH11_R)
    extrude(amount=-CUT_EXTRUDE6_DEPTH, mode=Mode.SUBTRACT)

    # Fillet5
    fillet5_edges = [part.edges().sort_by_distance(p)[0] for p in [
        (5.208514376, -18.75, 5),
        (-6.624818958, -18.75, 5),
    ]]
    fillet(fillet5_edges, radius=FILLET5_R)

    # Fillet6
    fillet6_edges = [part.edges().sort_by_distance(p)[0] for p in [
        (19.650217251, -6, 40),
        (-21.349782749, -6, 40),
    ]]
    fillet(fillet6_edges, radius=FILLET6_R)

    # Fillet7
    fillet7_edges = [part.edges().sort_by_distance(p)[0] for p in [
        (12.75701926, 18, 21),
        (-14.236955661, 18, 21),
        (19.650217251, 18, 21),
        (-21.349782749, 18, 21),
        (-21.349782749, 15, 21),
        (19.650217251, 15, 21),
    ]]
    fillet(fillet7_edges, radius=FILLET7_R)

    # Fillet8
    fillet8_edges = [part.edges().sort_by_distance(p)[0] for p in [
        (-15.861955661, 14.69723704, 42),
        (-12.891329478, 16.726231607, 42),
        (14.38201926, 14.604108849, 42),
        (18.490615971, 13.812712542, 42),
        (19.650217251, 15.907320139, 42),
        (15.63399045, 18, 42),
        (11.514560852, 16.68745011, 42),
        (12.827131129, 17.83709015, 42),
        (19.502458445, 15.060185137, 42),
        (19.064430813, 17.414213562, 42),
        (-20.150818324, 13.900018021, 42),
        (-21.349782749, 15.939649967, 42),
        (-17.191606676, 18, 42),
        (-20.763996311, 17.414213562, 42),
        (-14.293473316, 17.858080519, 42),
        (-21.180648978, 15.074359657, 42),
    ]]
    fillet(fillet8_edges, radius=FILLET8_R)

    # Fillet9
    fillet9_edges = [part.edges().sort_by_distance(p)[0] for p in [
        (19.650217251, -18.75, 40),
        (-13.624818958, -18.75, 40),
        (12.208514376, -18.75, 40),
        (-21.349782749, -18.75, 40),
    ]]
    fillet(fillet9_edges, radius=FILLET9_R)


solid = part.part
